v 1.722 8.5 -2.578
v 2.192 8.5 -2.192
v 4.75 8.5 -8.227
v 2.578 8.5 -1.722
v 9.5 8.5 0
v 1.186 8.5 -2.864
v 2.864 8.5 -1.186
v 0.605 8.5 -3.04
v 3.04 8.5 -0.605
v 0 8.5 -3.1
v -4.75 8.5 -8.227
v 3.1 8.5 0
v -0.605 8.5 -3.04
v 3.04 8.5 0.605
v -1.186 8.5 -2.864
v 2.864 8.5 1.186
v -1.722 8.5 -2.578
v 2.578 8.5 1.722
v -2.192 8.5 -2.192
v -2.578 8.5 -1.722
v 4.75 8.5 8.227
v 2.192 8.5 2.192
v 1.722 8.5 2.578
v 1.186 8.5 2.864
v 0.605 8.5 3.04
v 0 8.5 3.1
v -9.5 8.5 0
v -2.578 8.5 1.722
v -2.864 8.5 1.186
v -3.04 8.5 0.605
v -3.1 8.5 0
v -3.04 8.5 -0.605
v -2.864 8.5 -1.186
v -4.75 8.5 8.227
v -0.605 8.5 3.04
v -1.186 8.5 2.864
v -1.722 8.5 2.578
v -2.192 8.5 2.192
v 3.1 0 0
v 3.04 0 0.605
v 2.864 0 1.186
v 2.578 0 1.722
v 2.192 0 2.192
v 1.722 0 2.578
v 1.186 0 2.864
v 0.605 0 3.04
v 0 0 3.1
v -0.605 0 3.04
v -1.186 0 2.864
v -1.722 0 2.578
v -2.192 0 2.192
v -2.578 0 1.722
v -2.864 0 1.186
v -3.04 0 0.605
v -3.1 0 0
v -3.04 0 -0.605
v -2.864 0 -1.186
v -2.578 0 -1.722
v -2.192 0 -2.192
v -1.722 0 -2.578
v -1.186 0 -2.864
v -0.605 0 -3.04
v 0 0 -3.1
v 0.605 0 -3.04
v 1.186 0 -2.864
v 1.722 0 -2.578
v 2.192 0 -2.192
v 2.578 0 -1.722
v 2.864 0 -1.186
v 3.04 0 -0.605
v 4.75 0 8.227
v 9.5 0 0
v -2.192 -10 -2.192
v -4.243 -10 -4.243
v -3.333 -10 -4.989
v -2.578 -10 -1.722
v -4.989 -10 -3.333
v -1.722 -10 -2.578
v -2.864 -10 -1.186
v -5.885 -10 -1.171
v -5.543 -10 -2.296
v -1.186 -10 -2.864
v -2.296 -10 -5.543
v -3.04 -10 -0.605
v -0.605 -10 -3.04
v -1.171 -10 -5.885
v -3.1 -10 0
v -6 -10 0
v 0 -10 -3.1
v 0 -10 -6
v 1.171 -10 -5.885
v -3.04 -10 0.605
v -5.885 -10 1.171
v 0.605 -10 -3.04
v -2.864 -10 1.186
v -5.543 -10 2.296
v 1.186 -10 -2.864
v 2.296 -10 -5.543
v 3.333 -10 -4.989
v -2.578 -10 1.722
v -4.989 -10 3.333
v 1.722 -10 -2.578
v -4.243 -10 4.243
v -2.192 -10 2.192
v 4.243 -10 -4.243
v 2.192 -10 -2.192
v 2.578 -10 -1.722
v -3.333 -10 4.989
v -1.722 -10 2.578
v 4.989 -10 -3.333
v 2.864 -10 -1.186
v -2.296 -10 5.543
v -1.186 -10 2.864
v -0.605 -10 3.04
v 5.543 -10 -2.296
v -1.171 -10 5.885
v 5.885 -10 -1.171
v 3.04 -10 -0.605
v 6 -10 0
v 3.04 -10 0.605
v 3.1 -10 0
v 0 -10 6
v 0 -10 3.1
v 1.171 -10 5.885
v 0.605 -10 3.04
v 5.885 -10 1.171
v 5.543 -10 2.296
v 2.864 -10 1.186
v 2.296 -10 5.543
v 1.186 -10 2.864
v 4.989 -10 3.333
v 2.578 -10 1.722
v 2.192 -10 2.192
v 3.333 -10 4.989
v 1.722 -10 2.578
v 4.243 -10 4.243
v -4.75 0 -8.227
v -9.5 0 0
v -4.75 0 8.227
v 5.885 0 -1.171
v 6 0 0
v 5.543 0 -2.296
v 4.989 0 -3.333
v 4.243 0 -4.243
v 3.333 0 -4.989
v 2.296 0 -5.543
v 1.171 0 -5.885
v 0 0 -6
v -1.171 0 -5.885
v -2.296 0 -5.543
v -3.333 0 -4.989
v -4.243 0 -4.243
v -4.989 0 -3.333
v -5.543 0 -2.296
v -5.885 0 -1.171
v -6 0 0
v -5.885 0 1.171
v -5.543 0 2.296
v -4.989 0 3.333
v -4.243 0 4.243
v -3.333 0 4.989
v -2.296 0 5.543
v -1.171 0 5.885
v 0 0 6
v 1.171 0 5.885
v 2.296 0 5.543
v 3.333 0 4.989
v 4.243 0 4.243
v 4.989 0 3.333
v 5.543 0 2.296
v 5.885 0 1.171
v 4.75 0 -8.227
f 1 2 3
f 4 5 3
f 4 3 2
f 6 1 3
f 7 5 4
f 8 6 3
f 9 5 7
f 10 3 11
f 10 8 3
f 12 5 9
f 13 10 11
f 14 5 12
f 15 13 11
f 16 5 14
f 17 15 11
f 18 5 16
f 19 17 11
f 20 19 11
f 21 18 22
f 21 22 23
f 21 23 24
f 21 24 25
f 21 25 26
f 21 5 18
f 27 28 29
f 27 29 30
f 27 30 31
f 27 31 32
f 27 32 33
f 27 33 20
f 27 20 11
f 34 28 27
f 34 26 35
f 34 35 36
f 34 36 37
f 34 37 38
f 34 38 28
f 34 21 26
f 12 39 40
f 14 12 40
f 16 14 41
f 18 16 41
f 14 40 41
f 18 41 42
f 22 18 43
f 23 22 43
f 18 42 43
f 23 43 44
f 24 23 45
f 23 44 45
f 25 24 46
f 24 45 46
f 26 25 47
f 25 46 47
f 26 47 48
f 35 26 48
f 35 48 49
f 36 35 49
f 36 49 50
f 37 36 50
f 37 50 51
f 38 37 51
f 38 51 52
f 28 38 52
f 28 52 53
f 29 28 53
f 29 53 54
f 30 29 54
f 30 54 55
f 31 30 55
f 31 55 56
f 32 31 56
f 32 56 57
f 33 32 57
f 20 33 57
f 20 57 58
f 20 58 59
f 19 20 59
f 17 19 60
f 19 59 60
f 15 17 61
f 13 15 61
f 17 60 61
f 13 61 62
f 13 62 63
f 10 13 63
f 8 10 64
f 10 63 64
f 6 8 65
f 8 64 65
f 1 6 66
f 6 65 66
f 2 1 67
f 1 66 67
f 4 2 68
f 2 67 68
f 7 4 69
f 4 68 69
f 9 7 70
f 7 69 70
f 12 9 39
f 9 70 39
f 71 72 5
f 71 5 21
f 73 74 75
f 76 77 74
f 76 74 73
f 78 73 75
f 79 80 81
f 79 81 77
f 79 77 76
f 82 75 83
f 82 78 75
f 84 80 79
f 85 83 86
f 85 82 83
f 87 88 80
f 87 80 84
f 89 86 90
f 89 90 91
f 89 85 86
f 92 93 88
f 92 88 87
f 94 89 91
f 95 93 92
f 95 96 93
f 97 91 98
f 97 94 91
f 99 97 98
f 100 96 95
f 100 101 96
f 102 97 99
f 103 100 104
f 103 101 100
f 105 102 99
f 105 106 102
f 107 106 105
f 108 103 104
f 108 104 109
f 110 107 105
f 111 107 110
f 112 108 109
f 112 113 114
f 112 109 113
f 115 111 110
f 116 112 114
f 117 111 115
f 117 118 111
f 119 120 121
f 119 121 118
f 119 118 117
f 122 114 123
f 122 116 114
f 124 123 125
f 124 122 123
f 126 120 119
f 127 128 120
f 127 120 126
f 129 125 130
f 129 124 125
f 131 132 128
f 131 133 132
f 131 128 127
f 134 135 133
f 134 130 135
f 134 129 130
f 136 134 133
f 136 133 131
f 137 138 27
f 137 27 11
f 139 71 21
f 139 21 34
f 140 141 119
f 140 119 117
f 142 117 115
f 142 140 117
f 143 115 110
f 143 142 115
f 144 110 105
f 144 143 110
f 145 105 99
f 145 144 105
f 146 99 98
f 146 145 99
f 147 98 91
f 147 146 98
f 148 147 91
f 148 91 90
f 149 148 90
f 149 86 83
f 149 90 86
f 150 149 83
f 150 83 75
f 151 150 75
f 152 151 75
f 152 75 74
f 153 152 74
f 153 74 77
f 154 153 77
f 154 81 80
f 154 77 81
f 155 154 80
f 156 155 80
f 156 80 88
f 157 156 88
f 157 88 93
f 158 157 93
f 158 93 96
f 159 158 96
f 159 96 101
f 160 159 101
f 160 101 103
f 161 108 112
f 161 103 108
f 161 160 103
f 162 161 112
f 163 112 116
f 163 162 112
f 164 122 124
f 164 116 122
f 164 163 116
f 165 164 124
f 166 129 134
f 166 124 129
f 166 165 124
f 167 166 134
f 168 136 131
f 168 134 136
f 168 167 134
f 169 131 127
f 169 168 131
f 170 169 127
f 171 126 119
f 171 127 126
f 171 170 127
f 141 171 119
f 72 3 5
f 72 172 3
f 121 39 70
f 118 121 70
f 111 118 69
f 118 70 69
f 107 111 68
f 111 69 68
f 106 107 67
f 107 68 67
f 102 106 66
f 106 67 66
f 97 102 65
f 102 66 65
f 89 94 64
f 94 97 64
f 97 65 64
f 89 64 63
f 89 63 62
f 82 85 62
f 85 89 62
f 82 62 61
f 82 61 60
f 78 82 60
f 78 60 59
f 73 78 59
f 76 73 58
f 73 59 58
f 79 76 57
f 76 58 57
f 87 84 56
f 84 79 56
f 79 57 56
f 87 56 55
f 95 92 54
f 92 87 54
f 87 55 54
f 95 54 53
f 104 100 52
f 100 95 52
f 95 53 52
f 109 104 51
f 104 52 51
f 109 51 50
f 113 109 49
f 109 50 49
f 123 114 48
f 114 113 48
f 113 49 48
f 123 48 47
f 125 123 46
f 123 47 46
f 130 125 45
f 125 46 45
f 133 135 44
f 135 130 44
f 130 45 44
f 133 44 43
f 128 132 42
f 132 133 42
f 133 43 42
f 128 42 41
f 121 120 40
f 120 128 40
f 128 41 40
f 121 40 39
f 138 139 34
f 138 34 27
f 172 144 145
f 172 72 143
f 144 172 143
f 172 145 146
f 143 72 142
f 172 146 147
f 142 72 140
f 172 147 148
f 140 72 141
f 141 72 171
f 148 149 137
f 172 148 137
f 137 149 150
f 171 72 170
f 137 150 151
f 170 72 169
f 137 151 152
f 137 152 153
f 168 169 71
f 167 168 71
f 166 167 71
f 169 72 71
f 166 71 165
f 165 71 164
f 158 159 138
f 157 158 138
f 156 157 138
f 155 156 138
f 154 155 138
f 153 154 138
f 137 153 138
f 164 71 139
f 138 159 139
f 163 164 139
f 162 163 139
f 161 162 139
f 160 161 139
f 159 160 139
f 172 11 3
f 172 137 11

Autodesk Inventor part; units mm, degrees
ref_plane "YZ Plane" through (0, 0, 0) normal (1, 0, 0) x (0, 1, 0)
ref_plane "XZ Plane" through (0, 0, 0) normal (0, 1, 0) x (-1, 0, 0)
ref_plane "XY Plane" through (0, 0, 0) normal (0, 0, 1) x (1, 0, 0)
sketch "Sketch1" plane through (0, 0, 0) normal (0, 1, 0) x (-1, 0, 0)
  line L0 (-9.5, 0) -> (-4.75, 8.2272)
  line L1 (-4.75, 8.2272) -> (4.75, 8.2272)
  line L2 (4.75, 8.2272) -> (9.5, 0)
  line L3 (9.5, 0) -> (4.75, -8.2272)
  line L4 (4.75, -8.2272) -> (-4.75, -8.2272)
  line L5 (-4.75, -8.2272) -> (-9.5, 0)
  point P0 (0, 0)
  point P1 (0, 0)
  dimension "d2" = 9.5
extrude "Extrusion1" add sketch "Sketch1" along normal blind 8.5
sketch "Sketch2" plane through (0, 0, 0) normal (0, -1, 0) x (1, 0, 0)
  circle A0 centre (0, 0) radius 6
  circle A1 centre (0, 0) radius 3.1
  dimension "d5" = 12
  dimension "d6" = 6.2
extrude "Extrusion2" add sketch "Sketch2" along normal blind 10
sketch "Sketch3" plane through (0, 0, 0) normal (0, -1, 0) x (1, 0, 0)
  circle A0 centre (0, 0) radius 3.1
extrude "Extrusion3" cut sketch "Sketch3" against normal through all
thread "Thread1" size "M12x1.75" class "6g" standard "ANSI Metric M Profile" full length
properties part number "Premistoppa"
